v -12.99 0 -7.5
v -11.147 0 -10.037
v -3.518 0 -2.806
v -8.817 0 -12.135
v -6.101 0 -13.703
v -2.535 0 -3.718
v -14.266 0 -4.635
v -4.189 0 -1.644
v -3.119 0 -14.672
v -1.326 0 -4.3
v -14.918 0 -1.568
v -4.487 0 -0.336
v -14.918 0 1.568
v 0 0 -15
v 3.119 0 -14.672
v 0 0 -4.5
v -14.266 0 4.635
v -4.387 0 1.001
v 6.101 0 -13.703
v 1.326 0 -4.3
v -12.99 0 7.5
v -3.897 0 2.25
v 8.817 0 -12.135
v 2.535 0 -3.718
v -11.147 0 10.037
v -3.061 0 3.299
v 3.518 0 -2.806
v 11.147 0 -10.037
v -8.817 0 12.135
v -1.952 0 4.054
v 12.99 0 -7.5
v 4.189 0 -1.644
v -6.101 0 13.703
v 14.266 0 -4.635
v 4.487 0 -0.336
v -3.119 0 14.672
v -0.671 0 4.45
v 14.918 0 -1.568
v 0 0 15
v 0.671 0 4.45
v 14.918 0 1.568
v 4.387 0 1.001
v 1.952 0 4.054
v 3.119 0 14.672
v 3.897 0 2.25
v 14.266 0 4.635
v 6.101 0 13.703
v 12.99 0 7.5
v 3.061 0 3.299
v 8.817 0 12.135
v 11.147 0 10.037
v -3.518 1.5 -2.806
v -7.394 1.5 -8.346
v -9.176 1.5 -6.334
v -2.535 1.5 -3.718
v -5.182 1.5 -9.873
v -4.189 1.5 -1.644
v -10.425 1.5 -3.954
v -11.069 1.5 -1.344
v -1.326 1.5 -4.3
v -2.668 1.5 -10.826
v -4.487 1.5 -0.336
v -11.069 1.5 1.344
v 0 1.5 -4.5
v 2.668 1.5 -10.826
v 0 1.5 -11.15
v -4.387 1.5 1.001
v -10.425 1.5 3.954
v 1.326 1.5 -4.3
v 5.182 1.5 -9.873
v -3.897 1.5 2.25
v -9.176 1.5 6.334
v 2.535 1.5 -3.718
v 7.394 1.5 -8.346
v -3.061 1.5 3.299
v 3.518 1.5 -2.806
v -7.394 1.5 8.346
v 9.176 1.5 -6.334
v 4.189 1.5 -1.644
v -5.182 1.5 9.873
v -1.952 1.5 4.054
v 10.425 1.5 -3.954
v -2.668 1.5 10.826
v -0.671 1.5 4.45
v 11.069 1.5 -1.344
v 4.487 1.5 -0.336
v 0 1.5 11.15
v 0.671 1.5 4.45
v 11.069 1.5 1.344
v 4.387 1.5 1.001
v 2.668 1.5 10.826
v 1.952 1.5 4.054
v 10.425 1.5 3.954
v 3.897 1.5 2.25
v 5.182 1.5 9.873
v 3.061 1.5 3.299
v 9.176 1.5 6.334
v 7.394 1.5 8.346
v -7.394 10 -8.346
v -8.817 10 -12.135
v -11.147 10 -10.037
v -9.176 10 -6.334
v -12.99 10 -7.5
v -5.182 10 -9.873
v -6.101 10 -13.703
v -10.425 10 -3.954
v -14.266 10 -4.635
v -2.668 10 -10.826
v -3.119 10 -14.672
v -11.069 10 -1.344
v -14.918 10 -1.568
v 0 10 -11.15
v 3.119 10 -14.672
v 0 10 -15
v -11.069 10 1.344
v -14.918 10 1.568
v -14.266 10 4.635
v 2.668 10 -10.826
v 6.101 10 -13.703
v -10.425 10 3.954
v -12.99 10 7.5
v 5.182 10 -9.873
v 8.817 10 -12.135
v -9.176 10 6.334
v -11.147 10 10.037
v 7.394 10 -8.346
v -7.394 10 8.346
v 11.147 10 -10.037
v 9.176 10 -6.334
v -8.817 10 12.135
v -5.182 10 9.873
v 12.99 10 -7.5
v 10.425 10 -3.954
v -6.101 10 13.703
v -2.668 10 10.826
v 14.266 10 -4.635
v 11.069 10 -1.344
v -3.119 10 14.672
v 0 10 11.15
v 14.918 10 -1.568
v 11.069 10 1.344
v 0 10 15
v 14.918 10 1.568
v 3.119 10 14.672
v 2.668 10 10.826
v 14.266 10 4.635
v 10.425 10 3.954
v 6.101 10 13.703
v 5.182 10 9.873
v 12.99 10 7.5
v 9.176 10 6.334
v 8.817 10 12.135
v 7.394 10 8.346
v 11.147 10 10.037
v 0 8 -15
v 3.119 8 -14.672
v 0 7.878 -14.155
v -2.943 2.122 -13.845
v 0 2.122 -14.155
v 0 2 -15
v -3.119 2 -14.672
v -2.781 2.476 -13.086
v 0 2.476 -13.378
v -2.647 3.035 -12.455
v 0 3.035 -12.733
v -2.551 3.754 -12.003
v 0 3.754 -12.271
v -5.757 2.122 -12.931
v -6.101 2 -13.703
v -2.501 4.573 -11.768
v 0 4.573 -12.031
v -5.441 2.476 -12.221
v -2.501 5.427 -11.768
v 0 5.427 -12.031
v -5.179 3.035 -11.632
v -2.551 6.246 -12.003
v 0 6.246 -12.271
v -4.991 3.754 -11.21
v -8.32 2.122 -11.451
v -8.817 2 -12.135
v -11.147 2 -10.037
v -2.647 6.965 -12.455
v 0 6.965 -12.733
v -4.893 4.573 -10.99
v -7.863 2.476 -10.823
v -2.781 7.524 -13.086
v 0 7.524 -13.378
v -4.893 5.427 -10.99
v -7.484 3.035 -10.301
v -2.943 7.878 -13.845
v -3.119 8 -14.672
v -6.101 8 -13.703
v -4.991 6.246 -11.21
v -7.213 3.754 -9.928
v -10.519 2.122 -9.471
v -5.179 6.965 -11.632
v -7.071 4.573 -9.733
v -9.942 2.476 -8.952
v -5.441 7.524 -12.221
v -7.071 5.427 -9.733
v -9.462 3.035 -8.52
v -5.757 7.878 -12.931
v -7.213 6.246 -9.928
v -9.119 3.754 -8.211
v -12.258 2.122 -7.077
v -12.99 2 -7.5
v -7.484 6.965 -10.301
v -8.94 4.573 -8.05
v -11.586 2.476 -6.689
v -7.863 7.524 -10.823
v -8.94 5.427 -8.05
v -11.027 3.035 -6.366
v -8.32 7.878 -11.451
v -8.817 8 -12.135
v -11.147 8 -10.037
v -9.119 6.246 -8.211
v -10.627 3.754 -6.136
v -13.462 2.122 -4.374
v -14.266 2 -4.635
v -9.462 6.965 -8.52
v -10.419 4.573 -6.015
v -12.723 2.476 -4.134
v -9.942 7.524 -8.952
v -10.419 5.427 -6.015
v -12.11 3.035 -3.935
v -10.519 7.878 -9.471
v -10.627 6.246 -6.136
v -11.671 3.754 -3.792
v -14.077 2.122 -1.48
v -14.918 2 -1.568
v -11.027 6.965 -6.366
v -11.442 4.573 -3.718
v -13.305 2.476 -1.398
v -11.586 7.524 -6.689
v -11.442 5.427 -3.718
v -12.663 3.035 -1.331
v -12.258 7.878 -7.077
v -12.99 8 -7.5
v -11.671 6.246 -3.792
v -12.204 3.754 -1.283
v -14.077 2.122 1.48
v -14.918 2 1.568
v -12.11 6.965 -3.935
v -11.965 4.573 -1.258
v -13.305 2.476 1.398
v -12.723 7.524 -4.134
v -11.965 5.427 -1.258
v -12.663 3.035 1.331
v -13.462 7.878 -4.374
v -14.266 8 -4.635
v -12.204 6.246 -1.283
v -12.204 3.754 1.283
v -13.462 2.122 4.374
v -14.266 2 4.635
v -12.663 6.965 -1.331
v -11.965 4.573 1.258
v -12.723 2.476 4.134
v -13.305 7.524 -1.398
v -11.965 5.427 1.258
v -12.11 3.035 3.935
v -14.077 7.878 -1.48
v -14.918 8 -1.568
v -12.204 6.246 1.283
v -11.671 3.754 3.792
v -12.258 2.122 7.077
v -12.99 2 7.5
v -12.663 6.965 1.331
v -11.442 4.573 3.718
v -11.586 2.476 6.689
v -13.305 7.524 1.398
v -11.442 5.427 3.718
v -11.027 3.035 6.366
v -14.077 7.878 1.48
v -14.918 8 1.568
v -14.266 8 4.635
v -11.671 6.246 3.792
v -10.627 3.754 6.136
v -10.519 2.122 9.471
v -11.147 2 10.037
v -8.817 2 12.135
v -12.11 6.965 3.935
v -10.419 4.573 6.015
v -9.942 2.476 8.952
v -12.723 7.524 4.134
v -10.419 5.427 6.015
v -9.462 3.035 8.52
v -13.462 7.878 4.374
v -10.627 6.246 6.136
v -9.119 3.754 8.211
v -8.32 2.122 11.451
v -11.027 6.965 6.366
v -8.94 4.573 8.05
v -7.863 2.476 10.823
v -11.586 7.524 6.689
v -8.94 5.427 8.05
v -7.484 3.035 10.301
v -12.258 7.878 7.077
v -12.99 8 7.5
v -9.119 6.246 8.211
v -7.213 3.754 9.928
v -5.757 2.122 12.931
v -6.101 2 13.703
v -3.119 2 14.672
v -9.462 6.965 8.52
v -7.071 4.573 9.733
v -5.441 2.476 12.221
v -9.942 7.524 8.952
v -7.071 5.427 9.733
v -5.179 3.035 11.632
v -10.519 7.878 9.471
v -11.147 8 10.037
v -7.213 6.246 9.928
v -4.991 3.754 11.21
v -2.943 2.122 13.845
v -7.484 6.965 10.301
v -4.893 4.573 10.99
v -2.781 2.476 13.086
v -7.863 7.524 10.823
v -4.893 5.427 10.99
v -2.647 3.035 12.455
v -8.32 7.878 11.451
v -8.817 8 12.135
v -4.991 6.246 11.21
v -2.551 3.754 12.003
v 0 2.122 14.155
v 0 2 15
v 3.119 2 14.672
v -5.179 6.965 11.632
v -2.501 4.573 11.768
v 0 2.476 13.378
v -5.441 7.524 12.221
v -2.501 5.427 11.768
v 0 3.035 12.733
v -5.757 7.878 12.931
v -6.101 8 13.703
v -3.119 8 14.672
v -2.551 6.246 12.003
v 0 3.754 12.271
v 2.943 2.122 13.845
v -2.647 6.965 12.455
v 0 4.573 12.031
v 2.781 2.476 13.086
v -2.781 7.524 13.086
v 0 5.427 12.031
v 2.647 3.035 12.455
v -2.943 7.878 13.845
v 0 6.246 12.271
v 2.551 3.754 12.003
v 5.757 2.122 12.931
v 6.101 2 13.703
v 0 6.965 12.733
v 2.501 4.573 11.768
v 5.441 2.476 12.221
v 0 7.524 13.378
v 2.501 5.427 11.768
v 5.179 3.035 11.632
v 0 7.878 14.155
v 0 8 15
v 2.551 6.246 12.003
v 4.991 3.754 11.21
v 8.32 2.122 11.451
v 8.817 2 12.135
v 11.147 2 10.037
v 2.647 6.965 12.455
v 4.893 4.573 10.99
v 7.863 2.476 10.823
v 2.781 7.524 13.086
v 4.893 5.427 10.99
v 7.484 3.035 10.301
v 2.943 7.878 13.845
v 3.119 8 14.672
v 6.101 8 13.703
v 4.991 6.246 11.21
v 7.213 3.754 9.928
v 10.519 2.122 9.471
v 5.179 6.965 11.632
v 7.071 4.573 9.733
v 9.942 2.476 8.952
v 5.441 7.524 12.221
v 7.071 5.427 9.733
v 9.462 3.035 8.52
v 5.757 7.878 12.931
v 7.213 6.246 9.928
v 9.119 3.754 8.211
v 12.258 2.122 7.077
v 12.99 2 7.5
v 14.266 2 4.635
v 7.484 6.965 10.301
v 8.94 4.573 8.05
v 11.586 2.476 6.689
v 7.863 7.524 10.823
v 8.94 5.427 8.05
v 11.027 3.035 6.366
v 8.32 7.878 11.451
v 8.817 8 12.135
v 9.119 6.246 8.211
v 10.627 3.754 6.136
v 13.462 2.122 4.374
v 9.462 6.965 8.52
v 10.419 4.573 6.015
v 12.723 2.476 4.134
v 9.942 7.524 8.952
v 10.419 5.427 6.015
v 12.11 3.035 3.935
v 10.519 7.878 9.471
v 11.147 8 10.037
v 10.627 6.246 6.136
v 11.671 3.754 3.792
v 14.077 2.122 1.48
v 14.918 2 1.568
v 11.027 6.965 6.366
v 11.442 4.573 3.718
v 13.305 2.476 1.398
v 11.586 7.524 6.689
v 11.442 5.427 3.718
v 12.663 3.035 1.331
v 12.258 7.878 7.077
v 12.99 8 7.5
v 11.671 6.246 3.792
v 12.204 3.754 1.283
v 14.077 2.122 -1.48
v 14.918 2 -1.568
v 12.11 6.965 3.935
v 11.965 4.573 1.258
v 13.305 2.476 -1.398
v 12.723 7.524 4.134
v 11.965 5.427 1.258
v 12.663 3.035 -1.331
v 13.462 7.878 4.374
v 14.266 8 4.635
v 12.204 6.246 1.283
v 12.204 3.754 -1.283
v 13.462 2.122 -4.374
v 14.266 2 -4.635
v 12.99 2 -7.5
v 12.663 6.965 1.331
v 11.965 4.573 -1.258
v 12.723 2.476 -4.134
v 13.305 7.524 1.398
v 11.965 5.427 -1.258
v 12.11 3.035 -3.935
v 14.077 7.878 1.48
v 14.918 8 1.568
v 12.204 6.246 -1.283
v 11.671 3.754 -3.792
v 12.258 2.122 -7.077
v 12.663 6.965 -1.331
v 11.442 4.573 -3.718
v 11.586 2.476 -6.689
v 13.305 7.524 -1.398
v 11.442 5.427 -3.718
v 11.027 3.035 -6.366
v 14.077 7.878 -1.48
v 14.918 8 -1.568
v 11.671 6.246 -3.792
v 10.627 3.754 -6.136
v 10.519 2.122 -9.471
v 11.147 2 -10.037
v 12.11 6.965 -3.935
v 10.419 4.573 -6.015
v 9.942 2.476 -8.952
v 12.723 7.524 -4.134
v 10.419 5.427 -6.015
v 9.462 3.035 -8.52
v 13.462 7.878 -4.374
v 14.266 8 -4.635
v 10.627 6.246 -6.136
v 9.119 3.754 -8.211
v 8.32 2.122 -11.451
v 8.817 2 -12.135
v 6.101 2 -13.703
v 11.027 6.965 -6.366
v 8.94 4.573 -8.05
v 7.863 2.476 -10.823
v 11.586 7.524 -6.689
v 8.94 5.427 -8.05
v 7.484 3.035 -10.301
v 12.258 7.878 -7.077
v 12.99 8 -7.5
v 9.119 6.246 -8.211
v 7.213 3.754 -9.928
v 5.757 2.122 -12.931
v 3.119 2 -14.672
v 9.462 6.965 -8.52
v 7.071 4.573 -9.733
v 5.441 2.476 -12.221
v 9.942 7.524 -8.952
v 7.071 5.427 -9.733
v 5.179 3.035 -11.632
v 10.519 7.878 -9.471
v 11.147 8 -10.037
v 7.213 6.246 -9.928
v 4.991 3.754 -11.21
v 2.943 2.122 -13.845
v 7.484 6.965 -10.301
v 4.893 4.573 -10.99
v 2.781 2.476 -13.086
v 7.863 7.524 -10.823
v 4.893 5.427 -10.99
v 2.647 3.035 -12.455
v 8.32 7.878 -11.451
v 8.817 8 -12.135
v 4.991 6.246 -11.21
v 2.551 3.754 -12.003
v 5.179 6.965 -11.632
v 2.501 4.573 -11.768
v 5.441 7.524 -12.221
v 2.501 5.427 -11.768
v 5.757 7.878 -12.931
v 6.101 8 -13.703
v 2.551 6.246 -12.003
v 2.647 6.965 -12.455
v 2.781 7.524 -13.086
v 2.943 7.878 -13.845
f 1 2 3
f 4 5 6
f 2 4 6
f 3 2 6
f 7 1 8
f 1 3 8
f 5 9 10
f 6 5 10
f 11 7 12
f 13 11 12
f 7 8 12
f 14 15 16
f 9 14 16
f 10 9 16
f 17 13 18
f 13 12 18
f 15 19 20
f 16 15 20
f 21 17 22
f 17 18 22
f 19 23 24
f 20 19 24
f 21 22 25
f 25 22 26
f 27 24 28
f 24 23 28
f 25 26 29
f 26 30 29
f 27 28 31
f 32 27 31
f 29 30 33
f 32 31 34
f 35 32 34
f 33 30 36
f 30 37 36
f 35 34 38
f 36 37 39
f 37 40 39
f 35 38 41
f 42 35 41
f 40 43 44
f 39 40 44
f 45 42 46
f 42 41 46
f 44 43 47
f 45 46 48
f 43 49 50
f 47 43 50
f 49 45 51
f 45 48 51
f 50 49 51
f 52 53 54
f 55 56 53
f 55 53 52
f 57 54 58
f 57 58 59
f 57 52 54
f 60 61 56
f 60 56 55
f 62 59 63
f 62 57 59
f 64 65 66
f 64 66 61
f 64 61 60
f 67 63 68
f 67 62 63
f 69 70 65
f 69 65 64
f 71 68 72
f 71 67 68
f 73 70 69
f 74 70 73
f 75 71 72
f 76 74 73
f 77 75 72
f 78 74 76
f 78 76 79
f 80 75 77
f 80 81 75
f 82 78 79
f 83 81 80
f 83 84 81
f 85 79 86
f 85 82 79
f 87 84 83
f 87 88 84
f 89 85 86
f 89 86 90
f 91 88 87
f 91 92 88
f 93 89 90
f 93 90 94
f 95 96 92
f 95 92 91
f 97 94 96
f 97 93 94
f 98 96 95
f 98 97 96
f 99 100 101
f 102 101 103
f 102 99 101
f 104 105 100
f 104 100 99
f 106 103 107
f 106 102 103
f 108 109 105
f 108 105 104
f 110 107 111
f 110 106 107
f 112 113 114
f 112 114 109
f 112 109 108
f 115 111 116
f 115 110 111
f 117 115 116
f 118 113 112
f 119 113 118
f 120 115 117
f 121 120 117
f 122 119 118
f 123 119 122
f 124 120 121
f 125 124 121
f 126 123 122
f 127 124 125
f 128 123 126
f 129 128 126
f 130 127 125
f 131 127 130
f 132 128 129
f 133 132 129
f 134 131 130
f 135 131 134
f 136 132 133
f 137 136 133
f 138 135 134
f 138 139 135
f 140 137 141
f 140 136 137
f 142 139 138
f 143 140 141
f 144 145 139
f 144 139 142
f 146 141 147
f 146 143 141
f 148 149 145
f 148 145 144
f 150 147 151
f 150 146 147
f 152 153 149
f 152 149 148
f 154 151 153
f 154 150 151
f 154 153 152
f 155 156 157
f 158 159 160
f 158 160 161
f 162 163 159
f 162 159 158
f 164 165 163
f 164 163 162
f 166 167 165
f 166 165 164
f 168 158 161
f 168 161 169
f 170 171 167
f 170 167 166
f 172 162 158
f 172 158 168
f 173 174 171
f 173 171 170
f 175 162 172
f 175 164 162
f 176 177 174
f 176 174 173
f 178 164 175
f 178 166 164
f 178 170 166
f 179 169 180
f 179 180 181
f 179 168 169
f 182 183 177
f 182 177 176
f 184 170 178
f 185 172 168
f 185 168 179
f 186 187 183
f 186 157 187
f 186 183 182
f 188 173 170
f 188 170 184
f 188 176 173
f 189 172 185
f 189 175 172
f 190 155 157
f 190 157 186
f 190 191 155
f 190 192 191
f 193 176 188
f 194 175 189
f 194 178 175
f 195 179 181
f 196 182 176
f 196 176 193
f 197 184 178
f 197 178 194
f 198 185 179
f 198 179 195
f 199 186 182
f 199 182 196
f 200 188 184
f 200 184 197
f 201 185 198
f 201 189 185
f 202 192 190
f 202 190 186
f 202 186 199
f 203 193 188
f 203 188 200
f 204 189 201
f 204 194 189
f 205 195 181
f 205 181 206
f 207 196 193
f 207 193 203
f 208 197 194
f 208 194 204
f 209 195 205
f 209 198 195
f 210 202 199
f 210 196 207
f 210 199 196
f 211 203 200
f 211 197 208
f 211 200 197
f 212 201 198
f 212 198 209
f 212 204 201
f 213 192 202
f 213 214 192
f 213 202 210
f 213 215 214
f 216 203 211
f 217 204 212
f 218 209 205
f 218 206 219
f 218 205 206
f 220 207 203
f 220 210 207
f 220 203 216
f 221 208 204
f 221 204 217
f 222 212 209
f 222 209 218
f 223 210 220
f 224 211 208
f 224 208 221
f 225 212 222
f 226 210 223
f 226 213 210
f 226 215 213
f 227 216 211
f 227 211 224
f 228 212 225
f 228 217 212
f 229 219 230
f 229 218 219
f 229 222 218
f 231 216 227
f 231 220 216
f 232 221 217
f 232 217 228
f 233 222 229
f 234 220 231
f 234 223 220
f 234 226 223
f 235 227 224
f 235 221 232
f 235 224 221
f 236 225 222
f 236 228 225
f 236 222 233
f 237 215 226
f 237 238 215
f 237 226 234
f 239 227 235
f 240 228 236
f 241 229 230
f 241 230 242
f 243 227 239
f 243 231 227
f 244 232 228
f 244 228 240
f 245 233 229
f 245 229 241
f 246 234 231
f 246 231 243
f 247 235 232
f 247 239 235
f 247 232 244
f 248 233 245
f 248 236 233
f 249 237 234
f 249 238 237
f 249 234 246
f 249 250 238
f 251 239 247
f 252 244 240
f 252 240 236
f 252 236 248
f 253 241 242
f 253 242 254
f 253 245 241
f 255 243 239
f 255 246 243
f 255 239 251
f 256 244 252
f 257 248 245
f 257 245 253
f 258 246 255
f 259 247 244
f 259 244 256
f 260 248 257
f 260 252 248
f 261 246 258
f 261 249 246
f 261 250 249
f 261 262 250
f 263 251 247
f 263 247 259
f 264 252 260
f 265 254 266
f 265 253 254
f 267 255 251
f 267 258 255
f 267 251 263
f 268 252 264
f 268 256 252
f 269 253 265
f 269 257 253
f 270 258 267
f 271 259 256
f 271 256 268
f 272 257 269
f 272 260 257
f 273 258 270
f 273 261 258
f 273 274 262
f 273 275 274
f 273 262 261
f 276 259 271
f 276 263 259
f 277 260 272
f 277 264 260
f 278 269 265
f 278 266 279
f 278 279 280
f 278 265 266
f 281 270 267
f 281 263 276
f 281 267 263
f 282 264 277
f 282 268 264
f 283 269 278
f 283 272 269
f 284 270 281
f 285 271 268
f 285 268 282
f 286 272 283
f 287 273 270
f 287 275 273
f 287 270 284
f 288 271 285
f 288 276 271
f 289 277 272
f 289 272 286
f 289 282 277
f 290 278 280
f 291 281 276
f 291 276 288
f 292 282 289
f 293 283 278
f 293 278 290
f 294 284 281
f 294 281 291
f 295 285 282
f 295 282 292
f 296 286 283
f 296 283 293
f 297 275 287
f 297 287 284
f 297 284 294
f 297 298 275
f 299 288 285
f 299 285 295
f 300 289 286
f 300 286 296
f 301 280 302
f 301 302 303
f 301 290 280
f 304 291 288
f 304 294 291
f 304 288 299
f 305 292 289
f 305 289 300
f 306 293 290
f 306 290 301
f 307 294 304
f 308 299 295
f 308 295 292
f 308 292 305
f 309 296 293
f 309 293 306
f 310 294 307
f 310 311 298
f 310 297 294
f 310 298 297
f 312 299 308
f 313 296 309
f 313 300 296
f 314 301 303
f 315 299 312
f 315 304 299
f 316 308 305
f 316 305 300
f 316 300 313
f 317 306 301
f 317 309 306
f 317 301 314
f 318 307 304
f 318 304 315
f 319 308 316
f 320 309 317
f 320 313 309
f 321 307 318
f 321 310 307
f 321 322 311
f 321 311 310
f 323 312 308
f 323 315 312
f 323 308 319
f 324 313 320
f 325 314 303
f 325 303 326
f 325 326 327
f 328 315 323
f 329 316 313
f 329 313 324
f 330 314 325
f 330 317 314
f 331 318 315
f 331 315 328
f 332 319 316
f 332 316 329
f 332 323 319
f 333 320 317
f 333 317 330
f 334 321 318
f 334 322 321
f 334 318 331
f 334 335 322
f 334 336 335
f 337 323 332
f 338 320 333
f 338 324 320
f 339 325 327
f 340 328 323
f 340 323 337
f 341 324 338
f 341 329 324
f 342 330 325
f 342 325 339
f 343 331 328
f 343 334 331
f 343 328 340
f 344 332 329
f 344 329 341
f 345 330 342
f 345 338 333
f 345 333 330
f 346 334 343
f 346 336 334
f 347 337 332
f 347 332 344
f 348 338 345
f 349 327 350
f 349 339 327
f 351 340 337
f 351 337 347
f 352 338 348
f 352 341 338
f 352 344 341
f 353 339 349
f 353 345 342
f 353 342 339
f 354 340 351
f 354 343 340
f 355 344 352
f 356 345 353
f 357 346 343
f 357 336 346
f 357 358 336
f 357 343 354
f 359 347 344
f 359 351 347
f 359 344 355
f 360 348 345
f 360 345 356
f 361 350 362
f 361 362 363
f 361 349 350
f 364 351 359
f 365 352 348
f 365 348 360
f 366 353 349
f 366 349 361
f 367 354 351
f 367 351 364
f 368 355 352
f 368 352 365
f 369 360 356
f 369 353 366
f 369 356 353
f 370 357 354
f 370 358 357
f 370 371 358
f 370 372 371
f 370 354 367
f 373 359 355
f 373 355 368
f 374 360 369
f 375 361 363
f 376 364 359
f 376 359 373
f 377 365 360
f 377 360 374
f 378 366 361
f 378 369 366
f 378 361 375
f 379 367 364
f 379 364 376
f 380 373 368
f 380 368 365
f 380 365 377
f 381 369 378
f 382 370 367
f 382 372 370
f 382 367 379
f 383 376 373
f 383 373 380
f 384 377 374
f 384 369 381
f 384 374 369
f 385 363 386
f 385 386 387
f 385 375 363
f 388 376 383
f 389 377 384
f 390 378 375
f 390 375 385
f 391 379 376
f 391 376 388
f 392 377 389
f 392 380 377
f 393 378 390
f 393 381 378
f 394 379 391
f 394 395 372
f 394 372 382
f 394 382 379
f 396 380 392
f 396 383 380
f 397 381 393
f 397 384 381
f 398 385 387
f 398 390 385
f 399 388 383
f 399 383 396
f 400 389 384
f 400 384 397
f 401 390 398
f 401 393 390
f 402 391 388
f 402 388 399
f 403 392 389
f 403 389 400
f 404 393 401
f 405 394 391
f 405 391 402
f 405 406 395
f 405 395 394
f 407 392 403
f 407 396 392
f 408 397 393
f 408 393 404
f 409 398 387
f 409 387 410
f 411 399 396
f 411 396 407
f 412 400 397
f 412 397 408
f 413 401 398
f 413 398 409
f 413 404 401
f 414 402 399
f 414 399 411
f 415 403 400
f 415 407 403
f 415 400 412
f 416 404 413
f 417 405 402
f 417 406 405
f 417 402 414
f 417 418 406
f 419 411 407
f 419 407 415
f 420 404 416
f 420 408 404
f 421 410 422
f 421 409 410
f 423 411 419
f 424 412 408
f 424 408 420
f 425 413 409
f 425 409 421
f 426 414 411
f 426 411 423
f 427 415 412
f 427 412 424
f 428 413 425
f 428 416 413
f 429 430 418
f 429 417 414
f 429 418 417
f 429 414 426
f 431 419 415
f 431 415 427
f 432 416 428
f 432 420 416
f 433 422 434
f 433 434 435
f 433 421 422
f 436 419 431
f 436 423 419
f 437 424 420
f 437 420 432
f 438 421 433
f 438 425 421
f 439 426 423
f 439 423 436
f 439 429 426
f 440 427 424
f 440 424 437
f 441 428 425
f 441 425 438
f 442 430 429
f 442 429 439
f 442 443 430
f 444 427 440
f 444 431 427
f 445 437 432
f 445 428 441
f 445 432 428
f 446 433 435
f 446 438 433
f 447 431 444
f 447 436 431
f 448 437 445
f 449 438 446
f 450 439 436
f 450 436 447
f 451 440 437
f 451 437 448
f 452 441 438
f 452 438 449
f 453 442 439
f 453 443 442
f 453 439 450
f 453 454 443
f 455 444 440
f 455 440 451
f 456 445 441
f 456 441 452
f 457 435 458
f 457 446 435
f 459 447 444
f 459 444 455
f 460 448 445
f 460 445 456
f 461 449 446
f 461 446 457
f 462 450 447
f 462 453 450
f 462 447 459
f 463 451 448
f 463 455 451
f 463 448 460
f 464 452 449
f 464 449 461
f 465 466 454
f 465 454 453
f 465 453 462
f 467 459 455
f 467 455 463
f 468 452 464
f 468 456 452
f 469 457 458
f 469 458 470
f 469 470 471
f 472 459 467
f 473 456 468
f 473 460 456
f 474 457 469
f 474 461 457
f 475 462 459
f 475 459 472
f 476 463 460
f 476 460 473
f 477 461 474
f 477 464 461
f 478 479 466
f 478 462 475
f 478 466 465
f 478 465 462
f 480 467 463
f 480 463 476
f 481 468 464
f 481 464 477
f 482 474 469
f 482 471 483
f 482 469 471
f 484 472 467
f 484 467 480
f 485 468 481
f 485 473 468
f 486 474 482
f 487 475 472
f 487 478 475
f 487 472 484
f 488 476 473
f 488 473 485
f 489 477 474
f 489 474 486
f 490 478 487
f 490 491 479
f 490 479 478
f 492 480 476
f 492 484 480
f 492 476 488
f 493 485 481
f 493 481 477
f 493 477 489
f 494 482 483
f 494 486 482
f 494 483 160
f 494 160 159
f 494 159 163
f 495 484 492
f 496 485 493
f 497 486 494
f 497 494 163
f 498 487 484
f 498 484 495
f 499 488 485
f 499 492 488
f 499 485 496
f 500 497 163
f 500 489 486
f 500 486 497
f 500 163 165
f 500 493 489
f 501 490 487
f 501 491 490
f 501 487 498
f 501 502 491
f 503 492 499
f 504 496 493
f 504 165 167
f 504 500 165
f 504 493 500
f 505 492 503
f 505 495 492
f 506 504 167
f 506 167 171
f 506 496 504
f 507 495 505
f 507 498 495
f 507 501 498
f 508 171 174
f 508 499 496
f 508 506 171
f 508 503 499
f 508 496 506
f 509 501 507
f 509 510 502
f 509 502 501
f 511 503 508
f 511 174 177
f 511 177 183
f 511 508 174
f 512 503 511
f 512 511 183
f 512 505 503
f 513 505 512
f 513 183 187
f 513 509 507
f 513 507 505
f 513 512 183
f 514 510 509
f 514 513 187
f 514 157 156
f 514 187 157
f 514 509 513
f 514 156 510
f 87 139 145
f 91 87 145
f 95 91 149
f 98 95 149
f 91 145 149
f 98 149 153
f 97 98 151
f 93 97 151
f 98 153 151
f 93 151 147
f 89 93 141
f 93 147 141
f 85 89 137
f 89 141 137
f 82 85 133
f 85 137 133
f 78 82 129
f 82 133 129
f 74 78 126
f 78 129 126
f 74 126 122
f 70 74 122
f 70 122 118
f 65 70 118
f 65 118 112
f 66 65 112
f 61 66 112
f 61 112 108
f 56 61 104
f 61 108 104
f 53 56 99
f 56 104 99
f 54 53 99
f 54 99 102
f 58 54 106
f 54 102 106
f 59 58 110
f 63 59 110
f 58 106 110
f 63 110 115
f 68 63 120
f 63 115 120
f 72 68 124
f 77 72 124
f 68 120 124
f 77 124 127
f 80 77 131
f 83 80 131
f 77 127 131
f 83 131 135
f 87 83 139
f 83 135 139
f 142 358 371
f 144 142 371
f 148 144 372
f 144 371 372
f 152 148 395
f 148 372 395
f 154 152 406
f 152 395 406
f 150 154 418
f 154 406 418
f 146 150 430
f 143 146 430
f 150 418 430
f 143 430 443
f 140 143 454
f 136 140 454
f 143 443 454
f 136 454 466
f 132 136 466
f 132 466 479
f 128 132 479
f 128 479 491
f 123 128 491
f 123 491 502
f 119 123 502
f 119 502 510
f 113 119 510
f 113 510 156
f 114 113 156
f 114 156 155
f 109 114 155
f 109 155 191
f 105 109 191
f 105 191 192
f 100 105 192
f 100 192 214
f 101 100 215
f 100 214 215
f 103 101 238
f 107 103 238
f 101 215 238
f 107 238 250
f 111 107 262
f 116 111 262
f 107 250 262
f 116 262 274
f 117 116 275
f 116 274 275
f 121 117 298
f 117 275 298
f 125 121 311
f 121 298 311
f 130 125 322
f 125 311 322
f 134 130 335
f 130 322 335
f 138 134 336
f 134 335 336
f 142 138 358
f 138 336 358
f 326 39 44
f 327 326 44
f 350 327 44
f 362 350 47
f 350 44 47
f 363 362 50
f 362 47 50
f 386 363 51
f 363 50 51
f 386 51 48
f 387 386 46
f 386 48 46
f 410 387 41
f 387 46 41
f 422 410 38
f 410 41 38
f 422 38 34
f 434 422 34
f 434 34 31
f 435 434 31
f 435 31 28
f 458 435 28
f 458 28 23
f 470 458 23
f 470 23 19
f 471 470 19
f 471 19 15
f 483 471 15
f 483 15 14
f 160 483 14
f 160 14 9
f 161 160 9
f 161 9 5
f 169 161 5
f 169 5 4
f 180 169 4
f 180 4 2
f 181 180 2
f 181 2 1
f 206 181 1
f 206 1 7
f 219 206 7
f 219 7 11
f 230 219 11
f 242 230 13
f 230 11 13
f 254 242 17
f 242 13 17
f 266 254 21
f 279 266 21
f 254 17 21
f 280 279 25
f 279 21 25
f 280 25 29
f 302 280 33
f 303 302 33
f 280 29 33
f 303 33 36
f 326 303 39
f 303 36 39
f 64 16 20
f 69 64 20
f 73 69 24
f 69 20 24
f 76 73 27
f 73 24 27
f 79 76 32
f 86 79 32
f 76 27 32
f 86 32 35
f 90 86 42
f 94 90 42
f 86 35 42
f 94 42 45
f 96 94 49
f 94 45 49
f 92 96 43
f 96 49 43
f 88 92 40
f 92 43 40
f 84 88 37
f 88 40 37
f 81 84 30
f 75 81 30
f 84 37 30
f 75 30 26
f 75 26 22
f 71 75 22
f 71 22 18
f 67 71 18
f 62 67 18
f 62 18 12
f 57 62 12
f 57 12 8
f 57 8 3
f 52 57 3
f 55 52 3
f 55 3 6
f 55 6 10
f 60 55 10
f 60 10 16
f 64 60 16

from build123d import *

# Parameters (mm, degrees)
ESBO_O1_R                = 15
RESSALTO_EXTRUS_O1_DEPTH = 10
ESBO_O9_R                = 11.15
CORTE_EXTRUS_O1_DEPTH    = 8.5
ESBO_O10_R               = 4.5
CORTE_EXTRUS_O2_DEPTH    = 24.452078799


with BuildPart() as part:
    # Esboço1 → Ressalto-extrusão1 (new body)
    with BuildSketch(Plane(origin=(0, 0, 0), x_dir=(1, 0, 0), z_dir=(0, 1, 0))):
        with Locations(Location((0, 0, 0), (0, 0, 270))):
            Circle(ESBO_O1_R)
    extrude(amount=RESSALTO_EXTRUS_O1_DEPTH)

    # Esboço8 → Corte-Revolução1 (revolve, cut)
    with BuildSketch(Plane.XY, mode=Mode.PRIVATE) as corte_revolu_o1_sk:
        with BuildLine():
            Line((15, 8), (15, 2))
            ThreePointArc((15, 2), (12, 5), (15, 8))
        make_face()
    revolve(corte_revolu_o1_sk.sketch.rotate(Axis((0, 0, 0), (0, 1, 0)), 90), axis=Axis((0, 0, 0), (0, 1, 0)), mode=Mode.SUBTRACT)

    # Esboço9 → Corte-extrusão1 (cut)
    with BuildSketch(Plane(origin=(0, 10, 0), x_dir=(1, 0, 0), z_dir=(0, 1, 0))):
        with Locations(Location((0, 0, 0), (0, 0, 270))):
            Circle(ESBO_O9_R)
    extrude(amount=-CORTE_EXTRUS_O1_DEPTH, mode=Mode.SUBTRACT)

    # Esboço10 → Corte-extrusão2 (cut, through all)
    with BuildSketch(Plane.XZ):
        with Locations(Location((0, 0, 0), (0, 0, 270))):
            Circle(ESBO_O10_R)
    extrude(amount=-CORTE_EXTRUS_O2_DEPTH, mode=Mode.SUBTRACT)


solid = part.part
